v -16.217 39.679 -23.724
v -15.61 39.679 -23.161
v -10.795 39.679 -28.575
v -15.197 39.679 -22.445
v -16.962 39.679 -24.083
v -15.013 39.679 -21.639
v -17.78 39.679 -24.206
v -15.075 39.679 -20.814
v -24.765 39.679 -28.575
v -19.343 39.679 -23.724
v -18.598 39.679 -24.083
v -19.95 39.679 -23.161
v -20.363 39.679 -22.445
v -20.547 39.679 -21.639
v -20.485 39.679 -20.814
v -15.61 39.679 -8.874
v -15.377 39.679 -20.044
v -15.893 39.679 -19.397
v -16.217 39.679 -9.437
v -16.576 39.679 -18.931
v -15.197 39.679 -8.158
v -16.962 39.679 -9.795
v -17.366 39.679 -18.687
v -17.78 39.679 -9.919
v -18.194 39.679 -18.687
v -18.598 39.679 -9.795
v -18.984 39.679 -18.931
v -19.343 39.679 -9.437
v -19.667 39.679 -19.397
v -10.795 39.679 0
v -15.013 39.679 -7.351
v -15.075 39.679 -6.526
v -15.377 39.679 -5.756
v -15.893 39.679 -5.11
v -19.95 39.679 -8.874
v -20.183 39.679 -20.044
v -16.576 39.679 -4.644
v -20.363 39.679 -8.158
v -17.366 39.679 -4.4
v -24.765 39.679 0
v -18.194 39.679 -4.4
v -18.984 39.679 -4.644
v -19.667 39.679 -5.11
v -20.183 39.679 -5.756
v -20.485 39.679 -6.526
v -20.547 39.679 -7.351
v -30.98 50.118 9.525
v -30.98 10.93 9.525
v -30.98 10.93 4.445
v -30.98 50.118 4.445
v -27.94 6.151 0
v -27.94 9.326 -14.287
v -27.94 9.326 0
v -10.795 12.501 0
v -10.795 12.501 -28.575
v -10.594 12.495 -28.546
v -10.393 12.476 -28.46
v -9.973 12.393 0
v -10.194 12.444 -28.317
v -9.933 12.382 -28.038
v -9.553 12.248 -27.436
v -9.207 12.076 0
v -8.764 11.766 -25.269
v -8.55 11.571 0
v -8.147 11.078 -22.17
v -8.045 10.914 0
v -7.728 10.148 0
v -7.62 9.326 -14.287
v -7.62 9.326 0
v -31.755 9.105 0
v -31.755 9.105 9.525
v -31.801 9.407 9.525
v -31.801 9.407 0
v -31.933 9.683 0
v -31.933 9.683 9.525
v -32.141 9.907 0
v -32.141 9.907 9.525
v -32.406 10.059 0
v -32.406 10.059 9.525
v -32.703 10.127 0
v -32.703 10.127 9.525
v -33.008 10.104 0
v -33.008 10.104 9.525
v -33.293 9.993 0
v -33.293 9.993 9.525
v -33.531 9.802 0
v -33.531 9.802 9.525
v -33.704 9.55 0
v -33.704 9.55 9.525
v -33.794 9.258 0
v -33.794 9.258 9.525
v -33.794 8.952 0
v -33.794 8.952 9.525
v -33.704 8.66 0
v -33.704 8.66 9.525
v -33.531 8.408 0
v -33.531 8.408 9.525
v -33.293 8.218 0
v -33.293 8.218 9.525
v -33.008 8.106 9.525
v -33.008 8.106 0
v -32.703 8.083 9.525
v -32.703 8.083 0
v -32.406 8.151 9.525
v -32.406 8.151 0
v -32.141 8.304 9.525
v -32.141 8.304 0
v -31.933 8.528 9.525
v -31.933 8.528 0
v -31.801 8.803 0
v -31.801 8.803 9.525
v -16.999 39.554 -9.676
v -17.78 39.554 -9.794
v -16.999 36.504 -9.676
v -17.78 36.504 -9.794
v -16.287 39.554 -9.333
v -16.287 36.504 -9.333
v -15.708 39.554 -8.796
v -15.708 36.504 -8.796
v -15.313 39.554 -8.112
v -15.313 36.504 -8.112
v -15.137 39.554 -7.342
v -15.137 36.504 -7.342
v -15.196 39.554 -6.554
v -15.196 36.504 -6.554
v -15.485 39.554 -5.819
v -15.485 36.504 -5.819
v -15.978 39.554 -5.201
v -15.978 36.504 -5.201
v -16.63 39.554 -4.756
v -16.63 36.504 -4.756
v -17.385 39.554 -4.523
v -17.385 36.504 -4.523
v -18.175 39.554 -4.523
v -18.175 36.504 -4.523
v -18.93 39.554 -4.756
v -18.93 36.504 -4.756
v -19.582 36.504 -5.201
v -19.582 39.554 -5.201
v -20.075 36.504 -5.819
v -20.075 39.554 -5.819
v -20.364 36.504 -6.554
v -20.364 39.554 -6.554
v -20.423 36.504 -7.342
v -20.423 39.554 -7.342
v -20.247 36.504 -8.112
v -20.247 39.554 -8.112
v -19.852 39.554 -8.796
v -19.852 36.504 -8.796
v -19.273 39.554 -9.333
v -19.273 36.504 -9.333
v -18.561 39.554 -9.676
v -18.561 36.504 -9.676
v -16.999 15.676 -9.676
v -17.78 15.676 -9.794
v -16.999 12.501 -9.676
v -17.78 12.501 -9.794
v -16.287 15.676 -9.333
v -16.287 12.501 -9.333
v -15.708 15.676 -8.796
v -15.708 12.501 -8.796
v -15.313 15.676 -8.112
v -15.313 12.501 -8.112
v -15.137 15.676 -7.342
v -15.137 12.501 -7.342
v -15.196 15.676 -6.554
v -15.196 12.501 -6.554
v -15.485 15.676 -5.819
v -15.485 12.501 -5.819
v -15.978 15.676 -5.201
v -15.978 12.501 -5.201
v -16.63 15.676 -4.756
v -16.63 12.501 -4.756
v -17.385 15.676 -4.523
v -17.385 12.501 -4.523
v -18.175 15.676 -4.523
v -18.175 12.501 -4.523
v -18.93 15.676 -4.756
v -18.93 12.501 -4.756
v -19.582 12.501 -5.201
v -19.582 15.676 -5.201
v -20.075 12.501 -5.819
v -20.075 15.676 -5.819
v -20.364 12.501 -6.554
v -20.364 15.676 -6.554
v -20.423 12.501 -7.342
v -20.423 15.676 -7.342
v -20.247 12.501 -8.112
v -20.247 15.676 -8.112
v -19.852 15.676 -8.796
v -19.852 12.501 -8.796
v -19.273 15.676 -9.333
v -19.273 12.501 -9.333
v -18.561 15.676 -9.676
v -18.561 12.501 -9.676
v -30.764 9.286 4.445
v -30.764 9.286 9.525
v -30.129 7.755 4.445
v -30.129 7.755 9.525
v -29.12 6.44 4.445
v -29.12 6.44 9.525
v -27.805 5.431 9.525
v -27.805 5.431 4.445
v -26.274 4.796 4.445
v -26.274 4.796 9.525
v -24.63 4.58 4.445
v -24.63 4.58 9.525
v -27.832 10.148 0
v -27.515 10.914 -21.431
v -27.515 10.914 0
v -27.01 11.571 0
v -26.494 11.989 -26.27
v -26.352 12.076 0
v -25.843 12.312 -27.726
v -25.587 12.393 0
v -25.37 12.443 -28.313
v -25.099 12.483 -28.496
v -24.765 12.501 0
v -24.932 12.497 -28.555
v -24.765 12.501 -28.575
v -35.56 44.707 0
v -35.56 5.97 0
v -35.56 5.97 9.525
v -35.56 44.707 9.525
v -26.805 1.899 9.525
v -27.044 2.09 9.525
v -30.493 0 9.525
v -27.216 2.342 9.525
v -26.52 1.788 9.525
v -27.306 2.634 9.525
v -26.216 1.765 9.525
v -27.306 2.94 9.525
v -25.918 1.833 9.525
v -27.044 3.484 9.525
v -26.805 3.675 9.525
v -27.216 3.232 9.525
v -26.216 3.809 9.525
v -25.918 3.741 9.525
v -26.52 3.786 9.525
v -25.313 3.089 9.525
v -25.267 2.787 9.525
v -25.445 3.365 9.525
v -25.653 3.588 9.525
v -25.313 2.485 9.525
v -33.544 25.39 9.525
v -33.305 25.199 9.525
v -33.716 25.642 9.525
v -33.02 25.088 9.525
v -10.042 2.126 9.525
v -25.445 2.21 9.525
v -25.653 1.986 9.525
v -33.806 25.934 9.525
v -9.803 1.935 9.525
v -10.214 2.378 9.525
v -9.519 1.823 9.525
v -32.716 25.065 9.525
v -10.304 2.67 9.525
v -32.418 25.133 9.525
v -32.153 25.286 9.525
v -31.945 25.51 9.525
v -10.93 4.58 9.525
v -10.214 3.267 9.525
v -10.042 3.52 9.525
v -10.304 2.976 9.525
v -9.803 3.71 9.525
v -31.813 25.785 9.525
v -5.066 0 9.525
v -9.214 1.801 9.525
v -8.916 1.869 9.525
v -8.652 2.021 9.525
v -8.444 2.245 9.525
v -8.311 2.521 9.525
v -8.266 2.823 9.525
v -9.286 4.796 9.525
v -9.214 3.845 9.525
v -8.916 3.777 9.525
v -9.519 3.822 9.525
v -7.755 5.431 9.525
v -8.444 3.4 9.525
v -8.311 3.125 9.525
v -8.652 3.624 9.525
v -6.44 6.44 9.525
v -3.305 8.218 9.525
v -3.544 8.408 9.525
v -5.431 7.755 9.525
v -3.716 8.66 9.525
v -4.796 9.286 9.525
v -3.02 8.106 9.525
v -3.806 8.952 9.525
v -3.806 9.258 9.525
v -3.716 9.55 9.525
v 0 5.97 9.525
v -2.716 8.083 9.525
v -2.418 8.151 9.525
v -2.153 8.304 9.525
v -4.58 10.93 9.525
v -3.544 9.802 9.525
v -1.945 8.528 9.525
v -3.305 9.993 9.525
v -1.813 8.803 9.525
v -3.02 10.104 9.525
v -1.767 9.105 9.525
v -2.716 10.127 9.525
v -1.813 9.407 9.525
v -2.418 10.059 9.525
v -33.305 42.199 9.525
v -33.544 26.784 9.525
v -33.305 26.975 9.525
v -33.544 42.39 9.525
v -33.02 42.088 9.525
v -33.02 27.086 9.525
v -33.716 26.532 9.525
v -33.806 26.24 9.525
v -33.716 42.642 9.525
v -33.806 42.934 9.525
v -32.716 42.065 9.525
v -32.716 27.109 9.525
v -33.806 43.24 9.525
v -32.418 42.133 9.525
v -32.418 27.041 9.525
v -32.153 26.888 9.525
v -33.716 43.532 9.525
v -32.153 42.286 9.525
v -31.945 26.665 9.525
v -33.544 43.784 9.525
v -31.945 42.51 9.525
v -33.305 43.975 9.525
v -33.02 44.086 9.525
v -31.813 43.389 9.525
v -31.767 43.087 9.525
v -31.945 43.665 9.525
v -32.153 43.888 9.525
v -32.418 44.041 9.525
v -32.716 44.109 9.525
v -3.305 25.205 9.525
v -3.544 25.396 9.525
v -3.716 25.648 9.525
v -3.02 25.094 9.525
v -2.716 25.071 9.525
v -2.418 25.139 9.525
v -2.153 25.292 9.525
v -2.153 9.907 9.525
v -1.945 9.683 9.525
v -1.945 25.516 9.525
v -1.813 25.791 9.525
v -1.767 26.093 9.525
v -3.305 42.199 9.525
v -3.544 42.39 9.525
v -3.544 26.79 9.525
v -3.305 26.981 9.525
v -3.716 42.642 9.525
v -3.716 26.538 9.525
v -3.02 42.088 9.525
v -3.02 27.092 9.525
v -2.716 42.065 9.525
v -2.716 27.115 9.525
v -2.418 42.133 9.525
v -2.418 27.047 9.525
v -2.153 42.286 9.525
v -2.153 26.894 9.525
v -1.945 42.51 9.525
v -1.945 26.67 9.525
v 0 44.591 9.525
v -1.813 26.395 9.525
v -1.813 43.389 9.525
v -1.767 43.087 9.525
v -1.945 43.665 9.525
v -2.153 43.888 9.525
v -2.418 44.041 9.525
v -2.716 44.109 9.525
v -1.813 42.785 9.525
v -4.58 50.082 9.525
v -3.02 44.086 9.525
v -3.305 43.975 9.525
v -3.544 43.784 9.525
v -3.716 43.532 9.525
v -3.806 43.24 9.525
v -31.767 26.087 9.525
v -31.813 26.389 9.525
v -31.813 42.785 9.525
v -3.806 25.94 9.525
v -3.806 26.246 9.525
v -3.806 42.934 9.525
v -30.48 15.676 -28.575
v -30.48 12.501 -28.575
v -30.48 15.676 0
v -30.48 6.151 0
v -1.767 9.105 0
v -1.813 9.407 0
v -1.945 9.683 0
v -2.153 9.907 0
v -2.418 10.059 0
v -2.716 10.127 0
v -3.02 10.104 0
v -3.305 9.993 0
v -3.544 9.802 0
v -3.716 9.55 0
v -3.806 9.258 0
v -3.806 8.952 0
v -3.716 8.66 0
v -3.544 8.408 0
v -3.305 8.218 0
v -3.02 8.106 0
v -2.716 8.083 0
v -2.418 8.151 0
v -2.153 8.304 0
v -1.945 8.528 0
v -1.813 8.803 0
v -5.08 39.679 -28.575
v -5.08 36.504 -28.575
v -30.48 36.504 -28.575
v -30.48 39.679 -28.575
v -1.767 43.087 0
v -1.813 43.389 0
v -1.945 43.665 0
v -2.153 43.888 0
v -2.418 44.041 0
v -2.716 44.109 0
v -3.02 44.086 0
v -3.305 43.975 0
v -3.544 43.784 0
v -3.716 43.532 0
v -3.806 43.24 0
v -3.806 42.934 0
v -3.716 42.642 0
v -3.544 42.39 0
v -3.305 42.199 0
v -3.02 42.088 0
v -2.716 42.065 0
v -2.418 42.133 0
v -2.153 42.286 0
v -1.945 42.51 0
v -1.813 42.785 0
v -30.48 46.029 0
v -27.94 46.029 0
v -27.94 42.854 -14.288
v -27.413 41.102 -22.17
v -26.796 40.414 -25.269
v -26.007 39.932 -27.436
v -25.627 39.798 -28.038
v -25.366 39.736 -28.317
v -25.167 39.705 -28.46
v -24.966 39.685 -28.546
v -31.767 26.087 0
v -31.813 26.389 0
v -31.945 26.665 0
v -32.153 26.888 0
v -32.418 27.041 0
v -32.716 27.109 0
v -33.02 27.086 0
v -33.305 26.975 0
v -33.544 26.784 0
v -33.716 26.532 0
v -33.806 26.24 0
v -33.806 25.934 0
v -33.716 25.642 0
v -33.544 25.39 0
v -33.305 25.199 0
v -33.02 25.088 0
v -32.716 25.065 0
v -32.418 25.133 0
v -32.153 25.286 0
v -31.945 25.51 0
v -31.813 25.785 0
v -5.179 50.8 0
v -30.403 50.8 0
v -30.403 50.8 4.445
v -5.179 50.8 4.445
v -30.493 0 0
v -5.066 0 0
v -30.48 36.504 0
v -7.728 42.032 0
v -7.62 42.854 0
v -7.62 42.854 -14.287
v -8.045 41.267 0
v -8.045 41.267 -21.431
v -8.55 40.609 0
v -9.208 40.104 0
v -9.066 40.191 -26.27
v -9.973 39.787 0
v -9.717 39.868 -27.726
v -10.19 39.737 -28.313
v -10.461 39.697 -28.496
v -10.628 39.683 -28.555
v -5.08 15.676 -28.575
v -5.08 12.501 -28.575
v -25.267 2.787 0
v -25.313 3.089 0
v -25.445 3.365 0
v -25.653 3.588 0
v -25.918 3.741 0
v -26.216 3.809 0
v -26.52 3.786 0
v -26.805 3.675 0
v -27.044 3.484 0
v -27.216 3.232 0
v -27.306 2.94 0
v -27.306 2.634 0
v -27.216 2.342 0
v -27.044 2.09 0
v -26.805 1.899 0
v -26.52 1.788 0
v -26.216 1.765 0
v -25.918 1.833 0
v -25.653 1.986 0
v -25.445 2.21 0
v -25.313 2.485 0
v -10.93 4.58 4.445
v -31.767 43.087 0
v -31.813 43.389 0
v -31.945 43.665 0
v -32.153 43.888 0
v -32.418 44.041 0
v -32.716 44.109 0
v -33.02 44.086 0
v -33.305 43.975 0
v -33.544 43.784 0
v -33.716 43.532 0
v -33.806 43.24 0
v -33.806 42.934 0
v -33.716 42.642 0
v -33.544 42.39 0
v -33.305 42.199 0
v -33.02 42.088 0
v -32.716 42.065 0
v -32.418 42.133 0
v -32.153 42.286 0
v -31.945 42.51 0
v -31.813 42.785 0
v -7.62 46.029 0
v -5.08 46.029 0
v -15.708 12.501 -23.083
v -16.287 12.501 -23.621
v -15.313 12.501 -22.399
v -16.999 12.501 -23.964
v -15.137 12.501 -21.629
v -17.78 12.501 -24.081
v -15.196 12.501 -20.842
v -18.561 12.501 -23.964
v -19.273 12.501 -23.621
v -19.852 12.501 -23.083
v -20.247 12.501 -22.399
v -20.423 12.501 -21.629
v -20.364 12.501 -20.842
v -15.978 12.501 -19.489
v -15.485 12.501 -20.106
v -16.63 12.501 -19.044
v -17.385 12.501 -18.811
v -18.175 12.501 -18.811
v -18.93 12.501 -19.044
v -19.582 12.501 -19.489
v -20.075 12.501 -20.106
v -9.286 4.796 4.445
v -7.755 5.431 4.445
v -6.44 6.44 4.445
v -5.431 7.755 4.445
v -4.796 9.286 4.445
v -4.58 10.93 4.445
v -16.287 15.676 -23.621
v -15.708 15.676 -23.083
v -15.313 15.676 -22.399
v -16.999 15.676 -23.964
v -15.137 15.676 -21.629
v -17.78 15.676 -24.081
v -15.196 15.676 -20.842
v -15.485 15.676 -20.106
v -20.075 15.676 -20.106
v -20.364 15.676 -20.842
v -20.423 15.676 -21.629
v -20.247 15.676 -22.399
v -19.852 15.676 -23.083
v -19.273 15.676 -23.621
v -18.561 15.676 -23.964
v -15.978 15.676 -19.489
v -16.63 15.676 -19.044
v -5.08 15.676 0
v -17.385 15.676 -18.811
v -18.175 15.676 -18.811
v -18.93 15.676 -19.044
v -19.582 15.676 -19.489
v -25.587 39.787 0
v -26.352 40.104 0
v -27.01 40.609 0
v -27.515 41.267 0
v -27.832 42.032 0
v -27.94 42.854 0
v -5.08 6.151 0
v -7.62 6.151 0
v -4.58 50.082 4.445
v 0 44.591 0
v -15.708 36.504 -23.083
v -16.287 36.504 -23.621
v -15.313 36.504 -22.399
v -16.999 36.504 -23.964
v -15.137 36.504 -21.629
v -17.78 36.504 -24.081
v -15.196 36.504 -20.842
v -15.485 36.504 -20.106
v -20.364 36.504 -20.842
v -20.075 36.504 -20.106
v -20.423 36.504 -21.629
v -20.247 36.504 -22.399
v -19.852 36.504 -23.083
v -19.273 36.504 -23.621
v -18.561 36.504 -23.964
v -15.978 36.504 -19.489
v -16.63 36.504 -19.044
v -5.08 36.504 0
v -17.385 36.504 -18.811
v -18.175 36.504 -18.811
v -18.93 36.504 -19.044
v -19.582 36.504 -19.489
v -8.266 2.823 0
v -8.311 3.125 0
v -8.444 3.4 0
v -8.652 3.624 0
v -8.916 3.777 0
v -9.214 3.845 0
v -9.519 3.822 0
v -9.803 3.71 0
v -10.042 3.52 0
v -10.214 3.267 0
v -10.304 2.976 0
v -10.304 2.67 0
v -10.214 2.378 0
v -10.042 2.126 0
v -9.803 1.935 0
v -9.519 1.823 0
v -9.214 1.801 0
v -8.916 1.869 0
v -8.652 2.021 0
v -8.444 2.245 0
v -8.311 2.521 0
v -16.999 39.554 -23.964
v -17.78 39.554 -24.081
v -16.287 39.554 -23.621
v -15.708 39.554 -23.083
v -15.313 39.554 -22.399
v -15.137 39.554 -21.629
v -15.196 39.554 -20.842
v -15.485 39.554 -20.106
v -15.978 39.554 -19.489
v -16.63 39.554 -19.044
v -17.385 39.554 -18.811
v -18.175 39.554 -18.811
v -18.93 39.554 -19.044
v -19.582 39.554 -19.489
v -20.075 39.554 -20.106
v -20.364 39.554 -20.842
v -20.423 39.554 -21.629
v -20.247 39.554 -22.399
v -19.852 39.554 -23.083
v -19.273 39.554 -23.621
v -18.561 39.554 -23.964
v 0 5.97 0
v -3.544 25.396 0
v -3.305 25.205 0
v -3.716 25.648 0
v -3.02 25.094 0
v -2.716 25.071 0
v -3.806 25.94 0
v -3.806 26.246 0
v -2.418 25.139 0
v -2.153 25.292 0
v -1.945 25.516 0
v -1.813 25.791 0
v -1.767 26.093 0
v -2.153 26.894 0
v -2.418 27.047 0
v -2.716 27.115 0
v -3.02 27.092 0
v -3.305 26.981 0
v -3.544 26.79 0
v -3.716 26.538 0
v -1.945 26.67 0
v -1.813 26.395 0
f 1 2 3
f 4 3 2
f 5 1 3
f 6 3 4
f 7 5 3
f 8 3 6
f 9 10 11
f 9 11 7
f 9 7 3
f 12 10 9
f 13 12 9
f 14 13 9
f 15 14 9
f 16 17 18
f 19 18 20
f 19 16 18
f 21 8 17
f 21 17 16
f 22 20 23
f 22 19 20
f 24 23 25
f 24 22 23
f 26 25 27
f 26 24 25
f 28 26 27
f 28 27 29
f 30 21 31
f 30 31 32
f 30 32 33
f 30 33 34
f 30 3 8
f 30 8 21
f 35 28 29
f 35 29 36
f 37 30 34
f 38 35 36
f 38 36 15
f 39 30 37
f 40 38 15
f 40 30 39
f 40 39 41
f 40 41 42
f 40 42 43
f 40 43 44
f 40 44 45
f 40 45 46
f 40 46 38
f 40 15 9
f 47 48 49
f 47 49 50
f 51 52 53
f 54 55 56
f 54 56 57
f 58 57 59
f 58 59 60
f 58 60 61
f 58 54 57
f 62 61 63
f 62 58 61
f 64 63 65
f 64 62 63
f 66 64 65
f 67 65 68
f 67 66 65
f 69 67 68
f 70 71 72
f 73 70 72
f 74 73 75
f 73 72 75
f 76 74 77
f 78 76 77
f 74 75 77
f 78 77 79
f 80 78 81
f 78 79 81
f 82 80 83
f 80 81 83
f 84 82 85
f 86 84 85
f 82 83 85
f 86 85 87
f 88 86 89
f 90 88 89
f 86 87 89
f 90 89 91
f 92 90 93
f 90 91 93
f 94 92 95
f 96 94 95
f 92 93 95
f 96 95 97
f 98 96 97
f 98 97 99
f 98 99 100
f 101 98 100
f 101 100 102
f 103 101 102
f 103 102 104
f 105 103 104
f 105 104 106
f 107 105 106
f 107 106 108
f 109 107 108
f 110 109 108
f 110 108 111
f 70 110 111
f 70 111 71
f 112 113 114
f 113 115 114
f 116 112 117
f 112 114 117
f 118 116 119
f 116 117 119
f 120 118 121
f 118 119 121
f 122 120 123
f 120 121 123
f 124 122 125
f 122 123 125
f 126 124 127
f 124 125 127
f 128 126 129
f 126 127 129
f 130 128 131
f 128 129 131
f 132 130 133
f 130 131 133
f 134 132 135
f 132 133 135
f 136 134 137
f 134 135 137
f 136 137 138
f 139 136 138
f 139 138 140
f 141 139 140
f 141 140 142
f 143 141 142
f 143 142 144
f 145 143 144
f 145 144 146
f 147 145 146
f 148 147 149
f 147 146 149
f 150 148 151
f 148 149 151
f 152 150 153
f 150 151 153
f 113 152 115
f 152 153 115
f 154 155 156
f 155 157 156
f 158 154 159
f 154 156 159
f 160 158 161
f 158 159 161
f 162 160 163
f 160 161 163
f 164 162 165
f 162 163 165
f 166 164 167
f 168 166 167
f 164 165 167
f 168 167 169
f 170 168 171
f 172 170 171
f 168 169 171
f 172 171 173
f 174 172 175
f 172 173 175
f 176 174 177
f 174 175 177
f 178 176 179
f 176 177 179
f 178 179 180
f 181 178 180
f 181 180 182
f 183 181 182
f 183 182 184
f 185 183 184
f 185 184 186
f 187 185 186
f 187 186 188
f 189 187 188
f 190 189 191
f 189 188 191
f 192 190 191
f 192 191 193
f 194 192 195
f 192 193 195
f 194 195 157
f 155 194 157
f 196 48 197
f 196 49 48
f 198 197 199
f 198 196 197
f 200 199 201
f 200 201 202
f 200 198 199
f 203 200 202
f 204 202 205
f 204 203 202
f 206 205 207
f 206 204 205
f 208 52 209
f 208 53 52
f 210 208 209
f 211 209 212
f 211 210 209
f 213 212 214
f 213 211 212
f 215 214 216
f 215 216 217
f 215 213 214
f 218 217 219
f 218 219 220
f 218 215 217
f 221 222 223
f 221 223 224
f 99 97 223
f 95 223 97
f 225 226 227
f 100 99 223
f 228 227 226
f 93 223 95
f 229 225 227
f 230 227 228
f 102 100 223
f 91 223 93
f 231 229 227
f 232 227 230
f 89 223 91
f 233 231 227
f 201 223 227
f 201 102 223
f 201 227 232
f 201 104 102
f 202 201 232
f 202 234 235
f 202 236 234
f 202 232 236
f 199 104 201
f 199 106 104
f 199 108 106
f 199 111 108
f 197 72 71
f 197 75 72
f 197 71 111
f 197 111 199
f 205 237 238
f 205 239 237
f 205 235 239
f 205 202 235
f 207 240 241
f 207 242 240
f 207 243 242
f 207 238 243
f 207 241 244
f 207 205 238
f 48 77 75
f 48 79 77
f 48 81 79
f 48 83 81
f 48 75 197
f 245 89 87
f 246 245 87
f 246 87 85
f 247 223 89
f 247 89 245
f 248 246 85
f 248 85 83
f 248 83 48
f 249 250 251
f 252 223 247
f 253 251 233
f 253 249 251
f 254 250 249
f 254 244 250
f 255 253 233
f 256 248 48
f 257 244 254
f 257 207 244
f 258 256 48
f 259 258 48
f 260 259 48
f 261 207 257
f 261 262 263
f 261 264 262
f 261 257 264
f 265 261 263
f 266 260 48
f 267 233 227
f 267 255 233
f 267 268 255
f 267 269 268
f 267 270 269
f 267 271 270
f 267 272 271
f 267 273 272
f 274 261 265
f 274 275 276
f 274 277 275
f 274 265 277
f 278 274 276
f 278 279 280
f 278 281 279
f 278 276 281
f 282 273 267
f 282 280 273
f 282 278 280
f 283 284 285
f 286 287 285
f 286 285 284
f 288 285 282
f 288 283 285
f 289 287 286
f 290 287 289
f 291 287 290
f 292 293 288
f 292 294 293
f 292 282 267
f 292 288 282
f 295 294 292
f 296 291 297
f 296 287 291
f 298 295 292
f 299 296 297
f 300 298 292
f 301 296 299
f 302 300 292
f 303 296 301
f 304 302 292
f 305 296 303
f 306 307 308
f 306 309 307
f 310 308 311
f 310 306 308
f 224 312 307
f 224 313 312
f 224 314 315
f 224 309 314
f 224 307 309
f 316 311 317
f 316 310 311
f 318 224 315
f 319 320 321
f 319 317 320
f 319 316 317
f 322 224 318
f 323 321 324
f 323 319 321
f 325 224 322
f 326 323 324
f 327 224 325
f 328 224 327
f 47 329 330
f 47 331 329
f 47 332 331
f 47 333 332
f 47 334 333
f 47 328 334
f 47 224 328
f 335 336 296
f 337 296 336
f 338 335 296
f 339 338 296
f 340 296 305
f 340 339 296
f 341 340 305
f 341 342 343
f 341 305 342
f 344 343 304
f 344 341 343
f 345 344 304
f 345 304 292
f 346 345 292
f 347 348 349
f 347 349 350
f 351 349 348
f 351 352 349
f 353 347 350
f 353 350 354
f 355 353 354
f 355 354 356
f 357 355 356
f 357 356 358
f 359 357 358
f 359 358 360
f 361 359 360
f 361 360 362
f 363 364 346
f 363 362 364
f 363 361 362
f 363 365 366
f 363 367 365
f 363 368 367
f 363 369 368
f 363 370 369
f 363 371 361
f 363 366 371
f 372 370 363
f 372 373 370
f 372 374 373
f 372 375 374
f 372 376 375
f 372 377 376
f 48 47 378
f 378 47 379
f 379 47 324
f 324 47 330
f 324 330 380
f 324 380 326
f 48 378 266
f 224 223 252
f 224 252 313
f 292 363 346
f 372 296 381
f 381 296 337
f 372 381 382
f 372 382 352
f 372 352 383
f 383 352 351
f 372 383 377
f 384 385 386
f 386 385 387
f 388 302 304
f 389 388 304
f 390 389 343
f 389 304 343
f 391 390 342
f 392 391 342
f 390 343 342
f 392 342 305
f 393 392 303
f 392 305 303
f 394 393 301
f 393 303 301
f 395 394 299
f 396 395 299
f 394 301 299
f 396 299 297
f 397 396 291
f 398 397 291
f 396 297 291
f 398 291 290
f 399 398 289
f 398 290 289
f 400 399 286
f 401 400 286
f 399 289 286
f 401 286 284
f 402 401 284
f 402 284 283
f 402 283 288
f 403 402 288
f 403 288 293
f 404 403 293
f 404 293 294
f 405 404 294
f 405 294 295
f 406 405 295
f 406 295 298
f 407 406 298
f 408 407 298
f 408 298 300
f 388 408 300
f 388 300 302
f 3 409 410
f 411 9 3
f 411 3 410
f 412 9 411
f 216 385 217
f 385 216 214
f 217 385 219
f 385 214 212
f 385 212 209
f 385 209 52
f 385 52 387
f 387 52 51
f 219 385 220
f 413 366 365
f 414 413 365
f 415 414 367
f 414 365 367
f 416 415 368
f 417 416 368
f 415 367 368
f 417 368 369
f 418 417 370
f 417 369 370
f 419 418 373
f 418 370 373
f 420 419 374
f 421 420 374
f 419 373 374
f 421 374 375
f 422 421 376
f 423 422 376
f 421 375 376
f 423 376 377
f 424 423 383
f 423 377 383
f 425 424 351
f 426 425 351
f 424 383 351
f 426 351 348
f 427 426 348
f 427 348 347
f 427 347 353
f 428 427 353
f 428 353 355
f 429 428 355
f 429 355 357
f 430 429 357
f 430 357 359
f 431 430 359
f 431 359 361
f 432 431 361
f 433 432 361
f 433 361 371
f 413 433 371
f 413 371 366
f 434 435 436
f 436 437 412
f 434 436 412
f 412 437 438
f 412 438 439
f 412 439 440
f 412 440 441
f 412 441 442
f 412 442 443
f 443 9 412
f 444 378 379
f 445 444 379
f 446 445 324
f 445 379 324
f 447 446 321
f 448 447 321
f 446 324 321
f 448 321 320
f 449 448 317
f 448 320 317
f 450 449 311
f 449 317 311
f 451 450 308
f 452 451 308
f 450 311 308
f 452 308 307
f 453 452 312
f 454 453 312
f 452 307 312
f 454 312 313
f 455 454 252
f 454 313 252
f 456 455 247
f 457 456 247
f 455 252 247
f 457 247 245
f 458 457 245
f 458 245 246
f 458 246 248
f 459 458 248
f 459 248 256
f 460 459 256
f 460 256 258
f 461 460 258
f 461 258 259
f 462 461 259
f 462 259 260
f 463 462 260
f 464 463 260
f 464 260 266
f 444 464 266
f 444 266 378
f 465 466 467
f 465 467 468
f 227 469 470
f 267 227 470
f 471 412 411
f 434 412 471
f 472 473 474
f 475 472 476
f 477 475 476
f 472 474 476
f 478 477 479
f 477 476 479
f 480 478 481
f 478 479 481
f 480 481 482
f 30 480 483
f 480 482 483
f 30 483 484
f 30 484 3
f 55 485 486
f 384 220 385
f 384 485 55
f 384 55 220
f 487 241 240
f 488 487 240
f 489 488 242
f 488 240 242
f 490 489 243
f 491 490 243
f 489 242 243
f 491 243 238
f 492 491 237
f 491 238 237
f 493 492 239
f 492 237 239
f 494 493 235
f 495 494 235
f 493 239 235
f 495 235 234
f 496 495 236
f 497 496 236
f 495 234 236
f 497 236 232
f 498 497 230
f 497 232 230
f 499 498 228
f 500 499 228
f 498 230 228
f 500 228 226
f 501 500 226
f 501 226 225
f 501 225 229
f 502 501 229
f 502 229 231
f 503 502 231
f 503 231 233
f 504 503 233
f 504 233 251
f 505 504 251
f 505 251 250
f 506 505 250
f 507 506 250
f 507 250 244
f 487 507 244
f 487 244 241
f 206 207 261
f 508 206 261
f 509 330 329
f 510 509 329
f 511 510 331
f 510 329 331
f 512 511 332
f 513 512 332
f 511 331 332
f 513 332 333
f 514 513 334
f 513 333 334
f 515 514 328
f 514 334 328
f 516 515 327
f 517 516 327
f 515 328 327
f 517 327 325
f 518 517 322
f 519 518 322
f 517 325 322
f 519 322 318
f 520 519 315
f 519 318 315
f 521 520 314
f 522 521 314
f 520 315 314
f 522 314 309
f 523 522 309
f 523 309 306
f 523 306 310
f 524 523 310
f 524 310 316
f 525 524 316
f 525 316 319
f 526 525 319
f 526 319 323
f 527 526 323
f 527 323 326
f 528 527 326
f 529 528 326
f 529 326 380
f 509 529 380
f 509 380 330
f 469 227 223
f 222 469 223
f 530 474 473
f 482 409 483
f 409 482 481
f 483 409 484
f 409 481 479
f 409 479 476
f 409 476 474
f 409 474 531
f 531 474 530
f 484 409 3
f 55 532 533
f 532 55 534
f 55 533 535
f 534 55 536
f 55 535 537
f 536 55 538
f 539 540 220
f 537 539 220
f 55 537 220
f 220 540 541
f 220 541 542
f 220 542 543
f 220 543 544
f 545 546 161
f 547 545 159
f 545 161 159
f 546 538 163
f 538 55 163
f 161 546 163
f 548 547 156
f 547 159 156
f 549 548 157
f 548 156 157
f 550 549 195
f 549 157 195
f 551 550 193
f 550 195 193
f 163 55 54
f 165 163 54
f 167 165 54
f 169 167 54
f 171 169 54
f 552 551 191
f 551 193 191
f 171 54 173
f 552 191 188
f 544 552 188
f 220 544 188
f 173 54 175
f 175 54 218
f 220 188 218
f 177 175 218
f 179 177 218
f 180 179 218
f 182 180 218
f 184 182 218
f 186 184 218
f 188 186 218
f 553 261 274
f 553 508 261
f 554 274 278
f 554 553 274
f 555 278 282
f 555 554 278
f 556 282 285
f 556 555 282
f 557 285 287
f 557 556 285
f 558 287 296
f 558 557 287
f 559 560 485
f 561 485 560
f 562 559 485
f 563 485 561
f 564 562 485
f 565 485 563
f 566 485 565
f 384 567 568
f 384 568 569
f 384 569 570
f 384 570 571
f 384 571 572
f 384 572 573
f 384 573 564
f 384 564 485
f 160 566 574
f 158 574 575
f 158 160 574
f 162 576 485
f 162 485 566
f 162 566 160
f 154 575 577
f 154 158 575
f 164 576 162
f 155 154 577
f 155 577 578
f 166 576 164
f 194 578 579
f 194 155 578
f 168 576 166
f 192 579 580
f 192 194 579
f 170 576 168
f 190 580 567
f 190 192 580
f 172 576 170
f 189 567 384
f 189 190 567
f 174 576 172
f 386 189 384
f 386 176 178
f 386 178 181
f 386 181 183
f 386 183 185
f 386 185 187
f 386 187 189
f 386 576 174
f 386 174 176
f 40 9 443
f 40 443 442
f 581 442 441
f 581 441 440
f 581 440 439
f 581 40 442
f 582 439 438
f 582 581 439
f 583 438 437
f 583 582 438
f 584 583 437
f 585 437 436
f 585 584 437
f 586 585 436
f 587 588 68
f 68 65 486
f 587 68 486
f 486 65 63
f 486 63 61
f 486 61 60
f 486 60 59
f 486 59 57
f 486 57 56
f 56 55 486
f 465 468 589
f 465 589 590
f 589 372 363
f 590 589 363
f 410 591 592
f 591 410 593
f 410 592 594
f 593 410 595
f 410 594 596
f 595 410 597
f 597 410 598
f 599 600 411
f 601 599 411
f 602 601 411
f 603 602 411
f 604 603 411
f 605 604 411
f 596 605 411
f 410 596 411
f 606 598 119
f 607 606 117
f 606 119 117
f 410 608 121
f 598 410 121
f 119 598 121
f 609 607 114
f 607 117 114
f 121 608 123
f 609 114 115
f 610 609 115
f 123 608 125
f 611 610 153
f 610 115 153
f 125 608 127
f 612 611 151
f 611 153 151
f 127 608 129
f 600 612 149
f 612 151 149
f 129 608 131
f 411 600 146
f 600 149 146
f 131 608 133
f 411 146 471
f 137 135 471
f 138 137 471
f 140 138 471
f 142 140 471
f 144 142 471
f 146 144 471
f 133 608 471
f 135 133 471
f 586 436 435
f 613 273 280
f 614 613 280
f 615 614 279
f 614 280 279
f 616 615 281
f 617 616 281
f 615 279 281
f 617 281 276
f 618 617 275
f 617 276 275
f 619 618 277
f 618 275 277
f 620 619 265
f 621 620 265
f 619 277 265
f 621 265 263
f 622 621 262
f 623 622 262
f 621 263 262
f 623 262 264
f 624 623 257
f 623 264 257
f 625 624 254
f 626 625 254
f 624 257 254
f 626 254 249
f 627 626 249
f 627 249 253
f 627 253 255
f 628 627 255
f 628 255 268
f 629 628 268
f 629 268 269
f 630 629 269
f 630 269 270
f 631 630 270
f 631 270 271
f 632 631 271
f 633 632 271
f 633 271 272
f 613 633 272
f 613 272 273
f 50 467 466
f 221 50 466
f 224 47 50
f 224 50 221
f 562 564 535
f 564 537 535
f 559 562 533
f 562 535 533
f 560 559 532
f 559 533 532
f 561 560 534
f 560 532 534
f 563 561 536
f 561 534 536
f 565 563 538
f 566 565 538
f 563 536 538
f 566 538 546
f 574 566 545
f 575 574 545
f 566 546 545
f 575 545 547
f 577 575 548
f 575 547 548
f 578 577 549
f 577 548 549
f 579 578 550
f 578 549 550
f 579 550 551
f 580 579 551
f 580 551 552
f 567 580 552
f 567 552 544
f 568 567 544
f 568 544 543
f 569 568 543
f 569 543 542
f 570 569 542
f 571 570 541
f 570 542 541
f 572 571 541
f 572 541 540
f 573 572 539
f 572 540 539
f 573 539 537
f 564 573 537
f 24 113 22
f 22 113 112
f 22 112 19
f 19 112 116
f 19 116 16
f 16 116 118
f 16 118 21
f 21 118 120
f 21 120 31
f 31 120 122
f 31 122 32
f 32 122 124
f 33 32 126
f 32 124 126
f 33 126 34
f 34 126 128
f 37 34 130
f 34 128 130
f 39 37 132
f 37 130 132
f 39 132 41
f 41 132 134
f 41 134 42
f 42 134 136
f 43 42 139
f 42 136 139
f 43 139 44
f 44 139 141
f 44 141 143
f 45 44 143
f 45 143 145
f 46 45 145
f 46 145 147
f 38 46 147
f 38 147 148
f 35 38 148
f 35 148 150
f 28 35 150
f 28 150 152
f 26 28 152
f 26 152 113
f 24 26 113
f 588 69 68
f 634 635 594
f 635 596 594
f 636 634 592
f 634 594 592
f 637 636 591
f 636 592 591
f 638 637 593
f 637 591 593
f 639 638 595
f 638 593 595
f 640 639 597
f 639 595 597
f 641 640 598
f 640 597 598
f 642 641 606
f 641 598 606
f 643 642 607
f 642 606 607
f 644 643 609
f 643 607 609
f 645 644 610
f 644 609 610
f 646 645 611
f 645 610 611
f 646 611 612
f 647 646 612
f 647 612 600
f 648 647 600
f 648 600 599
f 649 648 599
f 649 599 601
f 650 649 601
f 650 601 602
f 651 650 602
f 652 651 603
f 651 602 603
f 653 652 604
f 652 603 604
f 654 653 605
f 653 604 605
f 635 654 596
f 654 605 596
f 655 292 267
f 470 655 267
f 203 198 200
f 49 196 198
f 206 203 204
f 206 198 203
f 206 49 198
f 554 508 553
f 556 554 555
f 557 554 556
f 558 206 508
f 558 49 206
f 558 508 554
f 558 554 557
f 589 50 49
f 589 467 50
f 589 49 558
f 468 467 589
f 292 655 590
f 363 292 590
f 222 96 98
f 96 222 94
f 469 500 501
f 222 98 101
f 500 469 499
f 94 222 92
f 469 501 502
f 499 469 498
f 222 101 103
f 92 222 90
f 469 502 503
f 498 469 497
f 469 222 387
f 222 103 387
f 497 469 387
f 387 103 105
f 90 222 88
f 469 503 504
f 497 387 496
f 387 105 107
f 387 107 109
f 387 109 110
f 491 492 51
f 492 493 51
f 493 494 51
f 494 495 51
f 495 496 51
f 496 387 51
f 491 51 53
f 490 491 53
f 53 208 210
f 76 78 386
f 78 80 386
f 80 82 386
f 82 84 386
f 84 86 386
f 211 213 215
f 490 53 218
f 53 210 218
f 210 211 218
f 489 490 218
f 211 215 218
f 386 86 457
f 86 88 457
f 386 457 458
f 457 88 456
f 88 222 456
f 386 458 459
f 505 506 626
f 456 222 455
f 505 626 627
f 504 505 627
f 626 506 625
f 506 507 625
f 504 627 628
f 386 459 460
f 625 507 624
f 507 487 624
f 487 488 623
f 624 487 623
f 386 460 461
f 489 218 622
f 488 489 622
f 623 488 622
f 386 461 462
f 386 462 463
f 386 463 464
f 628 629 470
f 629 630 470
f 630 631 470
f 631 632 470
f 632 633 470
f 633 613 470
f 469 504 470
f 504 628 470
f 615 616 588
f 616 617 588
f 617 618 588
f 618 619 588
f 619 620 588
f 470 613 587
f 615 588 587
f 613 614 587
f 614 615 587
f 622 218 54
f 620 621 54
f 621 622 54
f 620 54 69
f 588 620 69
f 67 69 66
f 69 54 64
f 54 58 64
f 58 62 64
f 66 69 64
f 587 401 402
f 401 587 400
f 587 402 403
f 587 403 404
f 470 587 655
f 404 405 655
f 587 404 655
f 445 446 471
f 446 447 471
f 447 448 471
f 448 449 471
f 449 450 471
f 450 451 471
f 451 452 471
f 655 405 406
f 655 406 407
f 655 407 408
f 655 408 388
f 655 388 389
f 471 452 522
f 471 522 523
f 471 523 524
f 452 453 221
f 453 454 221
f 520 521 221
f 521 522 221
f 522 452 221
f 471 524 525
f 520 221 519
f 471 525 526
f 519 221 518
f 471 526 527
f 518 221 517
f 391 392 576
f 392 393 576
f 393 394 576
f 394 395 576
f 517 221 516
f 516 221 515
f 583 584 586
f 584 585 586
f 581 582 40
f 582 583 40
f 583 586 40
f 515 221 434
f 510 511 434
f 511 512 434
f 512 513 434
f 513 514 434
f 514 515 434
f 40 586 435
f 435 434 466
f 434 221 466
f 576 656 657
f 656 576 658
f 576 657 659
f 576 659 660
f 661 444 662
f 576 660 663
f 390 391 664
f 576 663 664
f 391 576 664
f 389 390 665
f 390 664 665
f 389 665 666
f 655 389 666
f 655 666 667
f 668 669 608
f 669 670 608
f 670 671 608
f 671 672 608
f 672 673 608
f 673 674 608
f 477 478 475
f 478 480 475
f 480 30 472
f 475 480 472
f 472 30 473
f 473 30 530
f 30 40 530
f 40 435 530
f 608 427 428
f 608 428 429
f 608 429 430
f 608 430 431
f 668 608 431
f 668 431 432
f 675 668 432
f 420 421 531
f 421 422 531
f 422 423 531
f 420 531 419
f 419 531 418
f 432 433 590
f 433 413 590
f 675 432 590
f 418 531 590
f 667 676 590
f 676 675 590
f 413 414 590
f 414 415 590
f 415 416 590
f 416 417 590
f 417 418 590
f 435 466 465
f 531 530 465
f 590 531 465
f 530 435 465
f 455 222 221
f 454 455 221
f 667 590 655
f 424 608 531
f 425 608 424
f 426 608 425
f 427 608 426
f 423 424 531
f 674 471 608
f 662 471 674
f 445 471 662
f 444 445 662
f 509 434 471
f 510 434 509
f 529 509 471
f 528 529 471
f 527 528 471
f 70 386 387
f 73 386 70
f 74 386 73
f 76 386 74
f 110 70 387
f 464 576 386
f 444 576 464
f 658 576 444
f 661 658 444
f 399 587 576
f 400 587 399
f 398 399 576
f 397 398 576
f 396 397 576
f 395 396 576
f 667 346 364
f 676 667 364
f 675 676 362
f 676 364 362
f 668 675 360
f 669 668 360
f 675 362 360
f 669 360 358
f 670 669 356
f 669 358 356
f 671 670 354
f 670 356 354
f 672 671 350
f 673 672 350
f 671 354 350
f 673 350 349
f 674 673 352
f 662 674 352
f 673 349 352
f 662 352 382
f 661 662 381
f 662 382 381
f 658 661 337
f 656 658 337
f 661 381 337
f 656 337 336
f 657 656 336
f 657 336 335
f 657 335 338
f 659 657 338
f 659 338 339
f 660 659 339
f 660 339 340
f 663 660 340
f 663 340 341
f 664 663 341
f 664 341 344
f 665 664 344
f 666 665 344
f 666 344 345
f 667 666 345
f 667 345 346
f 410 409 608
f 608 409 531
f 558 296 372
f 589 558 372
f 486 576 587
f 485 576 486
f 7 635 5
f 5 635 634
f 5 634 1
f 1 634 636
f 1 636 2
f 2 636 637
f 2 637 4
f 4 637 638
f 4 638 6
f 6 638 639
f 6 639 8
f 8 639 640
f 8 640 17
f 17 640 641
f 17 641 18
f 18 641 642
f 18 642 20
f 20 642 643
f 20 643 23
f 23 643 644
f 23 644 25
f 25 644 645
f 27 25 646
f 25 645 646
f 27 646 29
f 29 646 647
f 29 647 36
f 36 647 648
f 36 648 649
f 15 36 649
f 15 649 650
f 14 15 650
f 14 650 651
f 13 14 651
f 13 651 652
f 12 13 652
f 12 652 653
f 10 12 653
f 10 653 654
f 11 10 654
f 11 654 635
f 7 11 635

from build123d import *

# Parameters (mm, degrees)
SKETCH1_W                      = 35.56
SKETCH1_H                      = 50.8
BOSS_EXTRUDE1_DEPTH            = 9.525
SKETCH2_W                      = 26.4
SKETCH2_H                      = 46.22
CUT_EXTRUDE2_DEPTH             = 5.08
TAP_DRILL_FOR_M2_5X0_45_TAP1_D = 2.05
SKETCH13_W                     = 25.4
SKETCH13_H                     = 3.175
BOSS_EXTRUDE2_DEPTH            = 28.575
CUT_EXTRUDE3_DEPTH             = 73.778867812
FILLET1_R                      = 6.35
M5_CLEARANCE_HOLE1_D           = 5.3
M5_CLEARANCE_HOLE1_CSINK_D     = 5.55
M5_CLEARANCE_HOLE1_CSINK_ANGLE = 90
RIB7_REACH                     = 67.774
SKETCH14_WALL_W                = 162.819779212
SKETCH14_WALL_H                = 2.54
RIB8_REACH                     = 67.774
SKETCH15_WALL_W                = 162.819779212
SKETCH15_WALL_H                = 2.54
RIB9_REACH                     = 67.774
SKETCH17_WALL_W                = 162.819779212
SKETCH17_WALL_H                = 2.54
RIB10_REACH                    = 67.774
SKETCH16_WALL_W                = 162.819779212
SKETCH16_WALL_H                = 2.54
FILLET2_R                      = 3.175
FILLET3_R                      = 3.175


with BuildPart() as part:
    # Sketch1 → Boss-Extrude1 (new body)
    with BuildSketch(Plane.XY):
        with Locations((-17.78, 25.4)):
            Rectangle(SKETCH1_W, SKETCH1_H)
    extrude(amount=BOSS_EXTRUDE1_DEPTH)

    # Sketch2 → Cut-Extrude2 (cut)
    with BuildSketch(Plane.XY.offset(9.525)):
        with Locations((-17.78, 27.69)):
            Rectangle(SKETCH2_W, SKETCH2_H)
    extrude(amount=-CUT_EXTRUDE2_DEPTH, mode=Mode.SUBTRACT)

    # Tap Drill for M2.5x0.45 Tap1 (through all)
    with Locations(Plane(origin=(0, 0, 0), x_dir=(-1, 0, 0), z_dir=(0, 0, -1))):
        with Locations((2.792369004, 43.087106138), (2.792369004, 26.092979092), (2.792369004, 9.105182099), (9.290740849, 2.822744672), (26.292369004, 2.787106138), (32.780032006, 9.105182099), (32.792369004, 26.087106138), (32.792369004, 43.087106138)):
            Hole(TAP_DRILL_FOR_M2_5X0_45_TAP1_D / 2)

    # Sketch13 → Boss-Extrude2 (add)
    with BuildSketch(Plane(origin=(0, 0, 0), x_dir=(-1, 0, 0), z_dir=(0, 0, -1))):
        with Locations((17.78, 38.091545037)):
            Rectangle(SKETCH13_W, SKETCH13_H)
        with Locations((17.78, 14.088545037)):
            Rectangle(SKETCH13_W, SKETCH13_H)
    extrude(amount=BOSS_EXTRUDE2_DEPTH)

    # Sketch8 → Cut-Extrude3 (cut, through all)
    with BuildSketch(Plane.XY.offset(9.525)):
        Polygon((-5.178964387, 50.8), (0, 44.591495864), (0, 50.8), align=None)
        Polygon((-35.56, 44.706622517), (-35.56, 50.8), (-30.402645731, 50.8), align=None)
        Polygon((-35.56, 5.970049098), (-35.56, 0), (-30.492594088, 0), align=None)
        Polygon((-5.092594088, -0.031324356), (0, 0), (0, 5.970049098), align=None)
    extrude(amount=-CUT_EXTRUDE3_DEPTH, mode=Mode.SUBTRACT)

    # Fillet1
    fillet1_edges = [part.edges().sort_by_distance(p)[0] for p in [
        (-4.58, 4.58, 6.985),
        (-30.98, 4.58, 6.985),
    ]]
    fillet(fillet1_edges, radius=FILLET1_R)

    # M5 Clearance Hole1 (through all)
    with Locations(Plane(origin=(-17.78, 39.679045037, -7.14375), x_dir=(0, 0, 1), z_dir=(0, 1, 0))):
        with Locations((0, 0), (-14.2875, 0)):
            CounterSinkHole(M5_CLEARANCE_HOLE1_D / 2, M5_CLEARANCE_HOLE1_CSINK_D / 2, counter_sink_angle=M5_CLEARANCE_HOLE1_CSINK_ANGLE)

    # Sketch14 wall → Rib7 (add, up to next)
    with BuildSketch(Plane(origin=(-30.48, 9.326045037, -14.2875), x_dir=(0, -0.216930457819, 0.976187060184), z_dir=(0, 0.976187060184, 0.216930457819)), mode=Mode.PRIVATE) as rib7_sk1:
        with Locations((0, 1.27)):
            Rectangle(SKETCH14_WALL_W, SKETCH14_WALL_H)
    rib7_tool1 = extrude(rib7_sk1.sketch, amount=RIB7_REACH, mode=Mode.PRIVATE) - part.part
    add(rib7_tool1.solids().sort_by_distance((-30.48, 9.326045037, -14.2875))[0])

    # Sketch15 wall → Rib8 (add, up to next)
    with BuildSketch(Plane(origin=(-5.08, 9.326045037, -14.2875), x_dir=(0, -0.216930457819, 0.976187060184), z_dir=(0, -0.976187060184, -0.216930457819)), mode=Mode.PRIVATE) as rib8_sk1:
        with Locations((0, 1.27)):
            Rectangle(SKETCH15_WALL_W, SKETCH15_WALL_H)
    rib8_tool1 = extrude(rib8_sk1.sketch, amount=-RIB8_REACH, mode=Mode.PRIVATE) - part.part
    add(rib8_tool1.solids().sort_by_distance((-5.08, 9.326045037, -14.2875))[0])

    # Sketch17 wall → Rib9 (add, up to next)
    with BuildSketch(Plane(origin=(-5.08, 42.854045037, -14.2875), x_dir=(0, 0.216930457819, 0.976187060184), z_dir=(0, -0.976187060184, 0.216930457819)), mode=Mode.PRIVATE) as rib9_sk1:
        with Locations((0, 1.27)):
            Rectangle(SKETCH17_WALL_W, SKETCH17_WALL_H)
    rib9_tool1 = extrude(rib9_sk1.sketch, amount=RIB9_REACH, mode=Mode.PRIVATE) - part.part
    add(rib9_tool1.solids().sort_by_distance((-5.08, 42.854045037, -14.2875))[0])

    # Sketch16 wall → Rib10 (add, up to next)
    with BuildSketch(Plane(origin=(-30.48, 42.854045037, -14.2875), x_dir=(0, 0.216930457819, 0.976187060184), z_dir=(0, 0.976187060184, -0.216930457819)), mode=Mode.PRIVATE) as rib10_sk1:
        with Locations((0, 1.27)):
            Rectangle(SKETCH16_WALL_W, SKETCH16_WALL_H)
    rib10_tool1 = extrude(rib10_sk1.sketch, amount=-RIB10_REACH, mode=Mode.PRIVATE) - part.part
    add(rib10_tool1.solids().sort_by_distance((-30.48, 42.854045037, -14.2875))[0])

    # Fillet2
    fillet2_edges = [part.edges().sort_by_distance(p)[0] for p in [
        (-27.94, 12.501045037, -14.2875),
        (-7.62, 12.501045037, -14.2875),
    ]]
    fillet(fillet2_edges, radius=FILLET2_R)

    # Fillet3
    fillet3_edges = [part.edges().sort_by_distance(p)[0] for p in [
        (-7.62, 39.679045037, -14.2875),
        (-27.94, 39.679045037, -14.2875),
    ]]
    fillet(fillet3_edges, radius=FILLET3_R)


solid = part.part
